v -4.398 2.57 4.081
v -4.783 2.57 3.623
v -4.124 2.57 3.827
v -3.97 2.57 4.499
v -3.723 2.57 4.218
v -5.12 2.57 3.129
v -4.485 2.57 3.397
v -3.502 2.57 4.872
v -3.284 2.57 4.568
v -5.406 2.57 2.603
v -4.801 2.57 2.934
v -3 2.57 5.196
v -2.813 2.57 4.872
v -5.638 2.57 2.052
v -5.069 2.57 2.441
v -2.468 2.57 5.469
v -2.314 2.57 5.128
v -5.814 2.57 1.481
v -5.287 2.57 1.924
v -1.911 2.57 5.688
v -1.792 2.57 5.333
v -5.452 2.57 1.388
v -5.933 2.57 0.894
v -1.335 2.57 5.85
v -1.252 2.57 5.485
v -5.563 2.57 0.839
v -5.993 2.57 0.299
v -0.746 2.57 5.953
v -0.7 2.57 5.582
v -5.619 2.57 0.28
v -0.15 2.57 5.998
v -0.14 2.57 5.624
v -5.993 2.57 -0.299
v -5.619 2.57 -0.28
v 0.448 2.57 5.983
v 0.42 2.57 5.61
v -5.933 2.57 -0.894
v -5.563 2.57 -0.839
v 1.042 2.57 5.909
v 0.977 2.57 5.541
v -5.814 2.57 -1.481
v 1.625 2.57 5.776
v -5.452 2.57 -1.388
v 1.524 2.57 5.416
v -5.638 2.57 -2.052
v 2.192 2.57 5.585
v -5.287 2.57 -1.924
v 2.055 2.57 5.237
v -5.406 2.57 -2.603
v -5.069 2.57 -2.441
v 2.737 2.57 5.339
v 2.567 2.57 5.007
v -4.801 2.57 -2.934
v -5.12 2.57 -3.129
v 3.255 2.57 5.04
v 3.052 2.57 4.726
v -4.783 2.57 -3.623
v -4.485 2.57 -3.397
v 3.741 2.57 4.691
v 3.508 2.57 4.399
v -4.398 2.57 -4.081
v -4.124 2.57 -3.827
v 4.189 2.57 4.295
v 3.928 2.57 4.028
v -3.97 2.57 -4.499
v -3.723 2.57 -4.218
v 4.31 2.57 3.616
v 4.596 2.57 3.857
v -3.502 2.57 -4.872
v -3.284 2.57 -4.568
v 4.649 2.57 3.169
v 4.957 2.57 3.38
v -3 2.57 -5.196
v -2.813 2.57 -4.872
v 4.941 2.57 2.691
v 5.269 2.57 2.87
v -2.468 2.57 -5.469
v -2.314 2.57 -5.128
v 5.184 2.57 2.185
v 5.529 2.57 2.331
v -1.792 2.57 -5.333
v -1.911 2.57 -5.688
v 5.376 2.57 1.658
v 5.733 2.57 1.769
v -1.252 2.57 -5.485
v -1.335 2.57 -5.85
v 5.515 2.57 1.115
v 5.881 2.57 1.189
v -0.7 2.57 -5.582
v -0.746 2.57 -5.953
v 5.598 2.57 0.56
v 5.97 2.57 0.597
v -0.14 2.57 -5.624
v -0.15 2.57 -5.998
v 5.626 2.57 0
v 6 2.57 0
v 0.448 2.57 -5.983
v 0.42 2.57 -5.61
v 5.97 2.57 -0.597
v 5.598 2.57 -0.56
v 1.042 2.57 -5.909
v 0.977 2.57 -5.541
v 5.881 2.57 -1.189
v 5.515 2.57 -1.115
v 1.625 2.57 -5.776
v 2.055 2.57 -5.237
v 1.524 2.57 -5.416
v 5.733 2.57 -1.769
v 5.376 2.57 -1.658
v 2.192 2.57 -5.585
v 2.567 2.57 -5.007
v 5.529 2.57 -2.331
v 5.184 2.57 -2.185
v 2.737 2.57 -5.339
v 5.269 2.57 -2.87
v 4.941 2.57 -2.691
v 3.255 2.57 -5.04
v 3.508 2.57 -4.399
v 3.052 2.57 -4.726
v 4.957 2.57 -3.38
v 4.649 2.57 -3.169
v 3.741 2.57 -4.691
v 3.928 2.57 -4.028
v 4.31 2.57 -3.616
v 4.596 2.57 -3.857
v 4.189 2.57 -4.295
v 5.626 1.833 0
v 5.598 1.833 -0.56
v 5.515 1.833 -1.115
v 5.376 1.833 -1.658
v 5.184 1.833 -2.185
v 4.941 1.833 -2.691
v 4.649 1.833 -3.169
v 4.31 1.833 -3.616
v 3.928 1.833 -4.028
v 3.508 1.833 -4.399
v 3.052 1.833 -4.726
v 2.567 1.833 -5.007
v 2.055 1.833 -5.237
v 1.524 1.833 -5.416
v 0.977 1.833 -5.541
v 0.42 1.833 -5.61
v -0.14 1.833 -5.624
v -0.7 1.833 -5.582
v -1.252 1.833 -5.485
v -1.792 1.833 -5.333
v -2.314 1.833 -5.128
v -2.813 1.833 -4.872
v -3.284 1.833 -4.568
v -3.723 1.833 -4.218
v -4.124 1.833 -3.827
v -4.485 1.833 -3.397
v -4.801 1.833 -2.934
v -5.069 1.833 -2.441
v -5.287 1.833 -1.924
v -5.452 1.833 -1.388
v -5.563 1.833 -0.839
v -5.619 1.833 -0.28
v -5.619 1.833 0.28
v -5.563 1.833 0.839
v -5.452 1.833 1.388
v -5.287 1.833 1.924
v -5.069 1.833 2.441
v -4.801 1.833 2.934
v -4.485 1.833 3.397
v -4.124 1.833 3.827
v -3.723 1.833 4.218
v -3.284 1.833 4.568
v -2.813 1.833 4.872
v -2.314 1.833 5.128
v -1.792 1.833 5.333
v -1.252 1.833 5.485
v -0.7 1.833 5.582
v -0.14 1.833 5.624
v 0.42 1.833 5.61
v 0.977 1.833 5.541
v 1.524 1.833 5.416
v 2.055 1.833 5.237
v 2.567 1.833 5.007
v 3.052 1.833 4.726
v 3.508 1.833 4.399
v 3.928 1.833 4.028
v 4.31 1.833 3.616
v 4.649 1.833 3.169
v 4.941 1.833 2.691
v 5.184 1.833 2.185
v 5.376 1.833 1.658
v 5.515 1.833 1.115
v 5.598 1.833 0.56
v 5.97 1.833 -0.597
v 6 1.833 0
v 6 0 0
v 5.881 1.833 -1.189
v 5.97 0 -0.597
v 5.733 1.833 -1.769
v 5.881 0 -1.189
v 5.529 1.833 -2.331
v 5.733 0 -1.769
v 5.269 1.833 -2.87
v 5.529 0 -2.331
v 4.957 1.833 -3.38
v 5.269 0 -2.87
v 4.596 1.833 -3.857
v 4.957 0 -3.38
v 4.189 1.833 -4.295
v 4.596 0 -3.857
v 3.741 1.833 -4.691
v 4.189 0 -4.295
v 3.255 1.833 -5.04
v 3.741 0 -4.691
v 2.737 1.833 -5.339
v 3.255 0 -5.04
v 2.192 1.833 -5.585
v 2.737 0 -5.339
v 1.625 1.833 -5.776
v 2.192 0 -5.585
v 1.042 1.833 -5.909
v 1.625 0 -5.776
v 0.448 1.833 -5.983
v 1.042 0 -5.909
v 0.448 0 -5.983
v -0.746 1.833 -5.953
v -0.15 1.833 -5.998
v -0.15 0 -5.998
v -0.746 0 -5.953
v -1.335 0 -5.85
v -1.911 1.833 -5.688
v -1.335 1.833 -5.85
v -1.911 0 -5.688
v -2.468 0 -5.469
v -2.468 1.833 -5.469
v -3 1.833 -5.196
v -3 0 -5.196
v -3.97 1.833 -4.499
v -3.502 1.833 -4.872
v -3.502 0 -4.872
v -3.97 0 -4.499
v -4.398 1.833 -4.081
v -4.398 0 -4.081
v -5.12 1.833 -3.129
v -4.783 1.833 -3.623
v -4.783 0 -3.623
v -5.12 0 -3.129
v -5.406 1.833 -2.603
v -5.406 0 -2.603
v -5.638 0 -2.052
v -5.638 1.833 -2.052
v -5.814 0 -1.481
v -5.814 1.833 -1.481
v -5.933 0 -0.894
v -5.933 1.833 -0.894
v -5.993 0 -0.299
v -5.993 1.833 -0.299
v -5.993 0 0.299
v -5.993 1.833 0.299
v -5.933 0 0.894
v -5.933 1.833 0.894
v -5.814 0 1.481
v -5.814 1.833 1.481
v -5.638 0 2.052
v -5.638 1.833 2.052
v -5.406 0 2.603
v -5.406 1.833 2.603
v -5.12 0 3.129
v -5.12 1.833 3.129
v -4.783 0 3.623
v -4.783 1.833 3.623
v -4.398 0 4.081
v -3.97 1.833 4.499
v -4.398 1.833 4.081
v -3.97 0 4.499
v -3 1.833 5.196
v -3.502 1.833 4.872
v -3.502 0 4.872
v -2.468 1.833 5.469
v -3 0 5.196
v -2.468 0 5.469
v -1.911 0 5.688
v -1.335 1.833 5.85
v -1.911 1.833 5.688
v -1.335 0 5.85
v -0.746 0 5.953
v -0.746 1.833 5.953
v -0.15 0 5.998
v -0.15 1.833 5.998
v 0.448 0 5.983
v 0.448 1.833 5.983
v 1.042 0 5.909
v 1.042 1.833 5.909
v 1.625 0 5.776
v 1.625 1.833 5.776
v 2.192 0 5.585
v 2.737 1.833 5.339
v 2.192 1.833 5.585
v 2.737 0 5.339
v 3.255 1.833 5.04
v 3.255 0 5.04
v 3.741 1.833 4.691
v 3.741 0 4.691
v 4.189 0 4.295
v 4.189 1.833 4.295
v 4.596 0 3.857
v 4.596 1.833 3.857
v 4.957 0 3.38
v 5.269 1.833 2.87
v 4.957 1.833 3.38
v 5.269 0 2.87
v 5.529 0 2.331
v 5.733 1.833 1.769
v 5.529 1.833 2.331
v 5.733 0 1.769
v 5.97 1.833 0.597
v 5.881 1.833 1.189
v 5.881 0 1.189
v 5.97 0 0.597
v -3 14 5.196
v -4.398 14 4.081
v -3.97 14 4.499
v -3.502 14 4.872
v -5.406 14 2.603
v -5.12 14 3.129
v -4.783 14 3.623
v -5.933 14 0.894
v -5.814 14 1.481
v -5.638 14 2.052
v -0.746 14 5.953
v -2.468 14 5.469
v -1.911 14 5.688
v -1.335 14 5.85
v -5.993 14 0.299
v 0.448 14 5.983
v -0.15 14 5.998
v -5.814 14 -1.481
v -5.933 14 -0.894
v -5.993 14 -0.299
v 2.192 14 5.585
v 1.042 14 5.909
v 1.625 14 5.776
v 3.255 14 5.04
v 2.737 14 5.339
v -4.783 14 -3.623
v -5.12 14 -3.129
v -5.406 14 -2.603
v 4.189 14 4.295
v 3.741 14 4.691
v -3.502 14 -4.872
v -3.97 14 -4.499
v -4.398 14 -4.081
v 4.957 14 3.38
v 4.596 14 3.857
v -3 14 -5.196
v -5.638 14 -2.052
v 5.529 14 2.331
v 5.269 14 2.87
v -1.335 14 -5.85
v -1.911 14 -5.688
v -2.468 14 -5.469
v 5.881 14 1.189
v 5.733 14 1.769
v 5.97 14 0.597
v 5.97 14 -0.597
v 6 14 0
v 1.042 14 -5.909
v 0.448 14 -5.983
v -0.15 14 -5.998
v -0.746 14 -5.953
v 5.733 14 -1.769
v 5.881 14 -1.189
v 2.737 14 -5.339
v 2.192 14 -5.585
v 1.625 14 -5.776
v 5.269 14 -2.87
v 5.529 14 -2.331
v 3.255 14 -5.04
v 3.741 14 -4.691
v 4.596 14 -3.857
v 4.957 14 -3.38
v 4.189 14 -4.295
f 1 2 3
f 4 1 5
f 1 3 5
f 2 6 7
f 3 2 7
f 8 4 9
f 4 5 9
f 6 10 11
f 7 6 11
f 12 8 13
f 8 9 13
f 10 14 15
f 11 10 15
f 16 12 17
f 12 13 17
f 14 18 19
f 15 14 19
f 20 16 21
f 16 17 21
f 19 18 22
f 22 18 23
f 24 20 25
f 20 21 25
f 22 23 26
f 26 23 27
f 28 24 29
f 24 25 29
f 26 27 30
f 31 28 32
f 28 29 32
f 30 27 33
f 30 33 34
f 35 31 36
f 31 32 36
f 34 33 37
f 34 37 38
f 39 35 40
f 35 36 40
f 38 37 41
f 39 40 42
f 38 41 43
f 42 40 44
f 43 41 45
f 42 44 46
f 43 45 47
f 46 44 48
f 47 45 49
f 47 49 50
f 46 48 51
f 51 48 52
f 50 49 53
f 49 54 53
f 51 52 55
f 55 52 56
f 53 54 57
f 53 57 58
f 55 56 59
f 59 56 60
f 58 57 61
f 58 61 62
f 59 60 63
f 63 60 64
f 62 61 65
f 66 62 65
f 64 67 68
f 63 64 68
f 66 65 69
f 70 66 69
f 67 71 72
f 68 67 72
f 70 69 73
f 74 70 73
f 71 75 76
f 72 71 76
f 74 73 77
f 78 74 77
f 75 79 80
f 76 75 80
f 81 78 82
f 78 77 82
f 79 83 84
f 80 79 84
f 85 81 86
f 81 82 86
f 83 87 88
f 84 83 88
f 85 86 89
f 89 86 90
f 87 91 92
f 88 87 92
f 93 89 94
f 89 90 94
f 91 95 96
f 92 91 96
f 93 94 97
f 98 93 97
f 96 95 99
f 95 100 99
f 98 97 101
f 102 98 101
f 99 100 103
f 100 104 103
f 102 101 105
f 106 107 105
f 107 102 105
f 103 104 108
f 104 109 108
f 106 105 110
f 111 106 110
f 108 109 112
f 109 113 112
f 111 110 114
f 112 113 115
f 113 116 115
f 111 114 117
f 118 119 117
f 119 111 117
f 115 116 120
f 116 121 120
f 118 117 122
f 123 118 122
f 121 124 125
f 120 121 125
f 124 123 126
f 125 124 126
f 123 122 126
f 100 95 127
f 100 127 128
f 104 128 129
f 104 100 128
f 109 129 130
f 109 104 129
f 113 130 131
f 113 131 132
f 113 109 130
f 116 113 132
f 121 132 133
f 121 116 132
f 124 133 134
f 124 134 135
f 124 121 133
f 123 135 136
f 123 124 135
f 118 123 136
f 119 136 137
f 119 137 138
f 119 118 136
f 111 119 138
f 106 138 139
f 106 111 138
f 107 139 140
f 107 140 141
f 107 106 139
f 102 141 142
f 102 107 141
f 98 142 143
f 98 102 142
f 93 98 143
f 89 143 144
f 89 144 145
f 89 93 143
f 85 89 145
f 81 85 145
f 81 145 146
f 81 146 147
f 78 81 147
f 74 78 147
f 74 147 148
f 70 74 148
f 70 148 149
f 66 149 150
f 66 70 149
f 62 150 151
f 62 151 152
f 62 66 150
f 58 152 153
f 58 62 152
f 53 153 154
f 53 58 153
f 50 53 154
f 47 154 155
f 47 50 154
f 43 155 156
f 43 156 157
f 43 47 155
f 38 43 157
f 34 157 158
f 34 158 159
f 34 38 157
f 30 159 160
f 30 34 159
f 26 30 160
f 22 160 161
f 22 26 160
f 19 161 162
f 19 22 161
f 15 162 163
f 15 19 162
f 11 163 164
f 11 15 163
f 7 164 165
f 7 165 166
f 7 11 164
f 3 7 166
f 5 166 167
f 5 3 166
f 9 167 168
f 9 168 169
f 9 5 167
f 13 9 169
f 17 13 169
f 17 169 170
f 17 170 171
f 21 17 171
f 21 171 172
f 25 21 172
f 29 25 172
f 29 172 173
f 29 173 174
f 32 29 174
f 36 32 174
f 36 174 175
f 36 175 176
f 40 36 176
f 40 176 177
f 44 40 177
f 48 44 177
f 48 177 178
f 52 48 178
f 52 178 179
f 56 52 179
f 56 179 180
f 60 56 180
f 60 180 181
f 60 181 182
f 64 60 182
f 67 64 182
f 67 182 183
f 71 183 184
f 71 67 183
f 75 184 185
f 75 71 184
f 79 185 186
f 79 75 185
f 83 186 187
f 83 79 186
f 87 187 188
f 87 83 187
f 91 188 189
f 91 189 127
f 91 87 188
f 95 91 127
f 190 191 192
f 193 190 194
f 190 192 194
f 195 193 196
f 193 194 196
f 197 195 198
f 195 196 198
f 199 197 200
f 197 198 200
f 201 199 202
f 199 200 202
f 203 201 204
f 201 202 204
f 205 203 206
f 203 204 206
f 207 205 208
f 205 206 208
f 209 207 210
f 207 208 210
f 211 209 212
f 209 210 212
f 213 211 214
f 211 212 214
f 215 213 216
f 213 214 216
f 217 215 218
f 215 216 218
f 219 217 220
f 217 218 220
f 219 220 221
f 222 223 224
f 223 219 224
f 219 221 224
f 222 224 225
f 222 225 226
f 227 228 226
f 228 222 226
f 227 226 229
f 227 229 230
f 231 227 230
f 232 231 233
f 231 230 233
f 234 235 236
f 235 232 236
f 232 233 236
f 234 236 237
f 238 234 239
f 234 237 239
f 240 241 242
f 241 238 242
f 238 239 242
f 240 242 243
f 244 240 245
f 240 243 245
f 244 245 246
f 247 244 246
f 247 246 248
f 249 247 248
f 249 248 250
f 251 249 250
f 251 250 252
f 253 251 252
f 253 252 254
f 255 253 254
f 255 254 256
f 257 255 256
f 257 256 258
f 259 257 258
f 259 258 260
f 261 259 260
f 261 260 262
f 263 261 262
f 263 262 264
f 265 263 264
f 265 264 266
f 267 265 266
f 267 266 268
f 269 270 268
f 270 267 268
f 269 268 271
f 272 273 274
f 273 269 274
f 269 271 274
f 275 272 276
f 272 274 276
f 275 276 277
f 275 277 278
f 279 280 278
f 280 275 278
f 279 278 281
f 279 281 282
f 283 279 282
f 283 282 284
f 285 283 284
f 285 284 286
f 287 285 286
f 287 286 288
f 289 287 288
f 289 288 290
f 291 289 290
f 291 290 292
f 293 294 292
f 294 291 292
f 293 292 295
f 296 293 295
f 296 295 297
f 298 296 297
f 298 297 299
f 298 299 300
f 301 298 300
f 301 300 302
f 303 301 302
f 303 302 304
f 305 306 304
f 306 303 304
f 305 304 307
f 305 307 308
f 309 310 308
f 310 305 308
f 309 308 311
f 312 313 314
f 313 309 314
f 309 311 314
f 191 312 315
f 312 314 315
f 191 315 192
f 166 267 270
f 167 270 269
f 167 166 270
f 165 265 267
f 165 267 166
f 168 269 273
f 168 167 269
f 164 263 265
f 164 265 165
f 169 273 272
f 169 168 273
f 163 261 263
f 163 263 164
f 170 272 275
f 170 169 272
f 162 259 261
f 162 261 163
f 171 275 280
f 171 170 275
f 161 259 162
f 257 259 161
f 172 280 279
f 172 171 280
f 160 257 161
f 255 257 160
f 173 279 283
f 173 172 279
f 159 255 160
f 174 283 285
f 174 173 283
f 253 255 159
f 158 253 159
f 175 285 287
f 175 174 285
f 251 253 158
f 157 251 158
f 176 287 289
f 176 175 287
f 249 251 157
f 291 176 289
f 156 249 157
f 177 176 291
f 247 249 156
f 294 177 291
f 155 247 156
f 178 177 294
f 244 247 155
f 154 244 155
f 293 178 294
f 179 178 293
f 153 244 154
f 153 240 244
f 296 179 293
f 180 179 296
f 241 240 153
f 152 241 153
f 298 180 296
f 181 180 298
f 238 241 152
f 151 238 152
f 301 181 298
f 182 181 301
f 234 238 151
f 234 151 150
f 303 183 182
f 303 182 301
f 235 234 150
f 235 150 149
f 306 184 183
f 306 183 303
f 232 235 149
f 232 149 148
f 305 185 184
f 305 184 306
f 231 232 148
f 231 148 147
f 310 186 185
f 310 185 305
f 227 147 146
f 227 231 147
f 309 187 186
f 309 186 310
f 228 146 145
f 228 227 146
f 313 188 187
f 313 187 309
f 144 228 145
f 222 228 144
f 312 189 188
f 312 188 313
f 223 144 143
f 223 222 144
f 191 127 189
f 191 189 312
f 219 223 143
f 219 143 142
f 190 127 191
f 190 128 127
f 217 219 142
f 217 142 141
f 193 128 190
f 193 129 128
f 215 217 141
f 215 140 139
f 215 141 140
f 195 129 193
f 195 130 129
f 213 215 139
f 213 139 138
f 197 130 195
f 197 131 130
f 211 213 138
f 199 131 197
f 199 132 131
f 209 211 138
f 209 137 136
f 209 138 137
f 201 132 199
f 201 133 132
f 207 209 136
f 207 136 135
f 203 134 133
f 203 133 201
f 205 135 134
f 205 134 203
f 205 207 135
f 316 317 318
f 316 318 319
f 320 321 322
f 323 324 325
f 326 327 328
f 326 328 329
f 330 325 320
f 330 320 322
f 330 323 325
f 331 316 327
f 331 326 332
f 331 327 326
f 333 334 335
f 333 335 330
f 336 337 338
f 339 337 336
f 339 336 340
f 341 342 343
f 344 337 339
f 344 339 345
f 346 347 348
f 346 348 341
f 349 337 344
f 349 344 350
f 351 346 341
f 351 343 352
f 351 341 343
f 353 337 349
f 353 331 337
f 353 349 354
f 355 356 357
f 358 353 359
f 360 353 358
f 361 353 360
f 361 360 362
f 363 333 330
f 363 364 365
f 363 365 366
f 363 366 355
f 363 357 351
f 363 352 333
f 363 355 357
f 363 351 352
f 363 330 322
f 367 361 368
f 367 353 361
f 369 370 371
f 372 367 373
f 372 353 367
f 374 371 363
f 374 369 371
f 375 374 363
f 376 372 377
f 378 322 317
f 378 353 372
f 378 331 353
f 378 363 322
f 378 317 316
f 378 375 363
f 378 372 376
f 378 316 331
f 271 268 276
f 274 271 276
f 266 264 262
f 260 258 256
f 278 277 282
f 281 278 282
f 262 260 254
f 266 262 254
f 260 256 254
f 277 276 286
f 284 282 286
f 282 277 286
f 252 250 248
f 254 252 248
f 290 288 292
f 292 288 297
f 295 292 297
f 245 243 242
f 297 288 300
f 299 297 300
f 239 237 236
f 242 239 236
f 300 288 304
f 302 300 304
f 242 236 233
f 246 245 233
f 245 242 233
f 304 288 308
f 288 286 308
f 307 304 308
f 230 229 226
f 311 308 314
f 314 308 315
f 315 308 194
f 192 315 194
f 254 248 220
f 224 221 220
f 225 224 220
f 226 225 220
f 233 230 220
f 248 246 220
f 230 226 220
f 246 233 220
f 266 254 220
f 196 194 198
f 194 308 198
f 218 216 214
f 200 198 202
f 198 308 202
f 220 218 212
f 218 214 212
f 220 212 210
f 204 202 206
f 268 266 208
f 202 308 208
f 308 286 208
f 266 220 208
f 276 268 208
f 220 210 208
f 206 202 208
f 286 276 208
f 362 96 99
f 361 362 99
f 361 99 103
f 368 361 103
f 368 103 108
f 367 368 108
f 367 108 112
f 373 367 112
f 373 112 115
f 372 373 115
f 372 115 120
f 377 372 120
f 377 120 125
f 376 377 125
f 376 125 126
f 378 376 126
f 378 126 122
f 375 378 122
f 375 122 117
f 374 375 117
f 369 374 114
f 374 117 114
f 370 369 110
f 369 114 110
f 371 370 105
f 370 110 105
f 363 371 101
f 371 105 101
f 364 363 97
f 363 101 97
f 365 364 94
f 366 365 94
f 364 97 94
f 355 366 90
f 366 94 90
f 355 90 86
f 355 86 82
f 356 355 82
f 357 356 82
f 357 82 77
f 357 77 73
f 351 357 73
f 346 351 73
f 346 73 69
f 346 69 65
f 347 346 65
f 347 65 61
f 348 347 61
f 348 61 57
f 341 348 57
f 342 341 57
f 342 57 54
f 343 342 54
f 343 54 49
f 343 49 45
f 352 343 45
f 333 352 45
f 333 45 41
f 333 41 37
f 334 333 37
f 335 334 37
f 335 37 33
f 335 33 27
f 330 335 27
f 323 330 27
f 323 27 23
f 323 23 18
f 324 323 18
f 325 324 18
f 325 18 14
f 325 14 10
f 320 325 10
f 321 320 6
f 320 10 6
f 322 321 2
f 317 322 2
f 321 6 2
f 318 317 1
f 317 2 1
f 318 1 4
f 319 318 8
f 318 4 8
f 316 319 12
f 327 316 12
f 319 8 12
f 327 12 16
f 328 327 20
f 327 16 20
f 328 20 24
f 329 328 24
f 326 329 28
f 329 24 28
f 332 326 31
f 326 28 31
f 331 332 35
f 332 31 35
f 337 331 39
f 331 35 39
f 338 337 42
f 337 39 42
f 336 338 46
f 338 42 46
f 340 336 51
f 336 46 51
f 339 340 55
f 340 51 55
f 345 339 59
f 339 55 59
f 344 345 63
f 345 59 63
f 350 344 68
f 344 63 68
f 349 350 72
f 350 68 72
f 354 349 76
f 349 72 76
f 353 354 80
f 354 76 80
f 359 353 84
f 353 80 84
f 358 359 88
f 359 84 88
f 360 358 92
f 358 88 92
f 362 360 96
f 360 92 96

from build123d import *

# Parameters (mm, degrees)
SKETCH1_R           = 6
BOSS_EXTRUDE1_DEPTH = 14
SKETCH2_R           = 5.6261
CUT_EXTRUDE1_DEPTH  = 0.7366


with BuildPart() as part:
    # Sketch1 → Boss-Extrude1 (new body)
    with BuildSketch(Plane(origin=(0, 0, 0), x_dir=(1, 0, 0), z_dir=(0, 1, 0))):
        Circle(SKETCH1_R)
    extrude(amount=BOSS_EXTRUDE1_DEPTH)

    # Sketch2 → Cut-Extrude1 (cut)
    with BuildSketch(Plane(origin=(0, 2.57, 0), x_dir=(1, 0, 0), z_dir=(0, 1, 0))):
        Polygon((-7.915464339, 6.772300258), (-7.748596028, -7.998854616), (10.395730316, -7.998854616), (9.153265383, 7.840750397), align=None)
        Circle(SKETCH2_R, mode=Mode.SUBTRACT)
    extrude(amount=-CUT_EXTRUDE1_DEPTH, mode=Mode.SUBTRACT)


solid = part.part
